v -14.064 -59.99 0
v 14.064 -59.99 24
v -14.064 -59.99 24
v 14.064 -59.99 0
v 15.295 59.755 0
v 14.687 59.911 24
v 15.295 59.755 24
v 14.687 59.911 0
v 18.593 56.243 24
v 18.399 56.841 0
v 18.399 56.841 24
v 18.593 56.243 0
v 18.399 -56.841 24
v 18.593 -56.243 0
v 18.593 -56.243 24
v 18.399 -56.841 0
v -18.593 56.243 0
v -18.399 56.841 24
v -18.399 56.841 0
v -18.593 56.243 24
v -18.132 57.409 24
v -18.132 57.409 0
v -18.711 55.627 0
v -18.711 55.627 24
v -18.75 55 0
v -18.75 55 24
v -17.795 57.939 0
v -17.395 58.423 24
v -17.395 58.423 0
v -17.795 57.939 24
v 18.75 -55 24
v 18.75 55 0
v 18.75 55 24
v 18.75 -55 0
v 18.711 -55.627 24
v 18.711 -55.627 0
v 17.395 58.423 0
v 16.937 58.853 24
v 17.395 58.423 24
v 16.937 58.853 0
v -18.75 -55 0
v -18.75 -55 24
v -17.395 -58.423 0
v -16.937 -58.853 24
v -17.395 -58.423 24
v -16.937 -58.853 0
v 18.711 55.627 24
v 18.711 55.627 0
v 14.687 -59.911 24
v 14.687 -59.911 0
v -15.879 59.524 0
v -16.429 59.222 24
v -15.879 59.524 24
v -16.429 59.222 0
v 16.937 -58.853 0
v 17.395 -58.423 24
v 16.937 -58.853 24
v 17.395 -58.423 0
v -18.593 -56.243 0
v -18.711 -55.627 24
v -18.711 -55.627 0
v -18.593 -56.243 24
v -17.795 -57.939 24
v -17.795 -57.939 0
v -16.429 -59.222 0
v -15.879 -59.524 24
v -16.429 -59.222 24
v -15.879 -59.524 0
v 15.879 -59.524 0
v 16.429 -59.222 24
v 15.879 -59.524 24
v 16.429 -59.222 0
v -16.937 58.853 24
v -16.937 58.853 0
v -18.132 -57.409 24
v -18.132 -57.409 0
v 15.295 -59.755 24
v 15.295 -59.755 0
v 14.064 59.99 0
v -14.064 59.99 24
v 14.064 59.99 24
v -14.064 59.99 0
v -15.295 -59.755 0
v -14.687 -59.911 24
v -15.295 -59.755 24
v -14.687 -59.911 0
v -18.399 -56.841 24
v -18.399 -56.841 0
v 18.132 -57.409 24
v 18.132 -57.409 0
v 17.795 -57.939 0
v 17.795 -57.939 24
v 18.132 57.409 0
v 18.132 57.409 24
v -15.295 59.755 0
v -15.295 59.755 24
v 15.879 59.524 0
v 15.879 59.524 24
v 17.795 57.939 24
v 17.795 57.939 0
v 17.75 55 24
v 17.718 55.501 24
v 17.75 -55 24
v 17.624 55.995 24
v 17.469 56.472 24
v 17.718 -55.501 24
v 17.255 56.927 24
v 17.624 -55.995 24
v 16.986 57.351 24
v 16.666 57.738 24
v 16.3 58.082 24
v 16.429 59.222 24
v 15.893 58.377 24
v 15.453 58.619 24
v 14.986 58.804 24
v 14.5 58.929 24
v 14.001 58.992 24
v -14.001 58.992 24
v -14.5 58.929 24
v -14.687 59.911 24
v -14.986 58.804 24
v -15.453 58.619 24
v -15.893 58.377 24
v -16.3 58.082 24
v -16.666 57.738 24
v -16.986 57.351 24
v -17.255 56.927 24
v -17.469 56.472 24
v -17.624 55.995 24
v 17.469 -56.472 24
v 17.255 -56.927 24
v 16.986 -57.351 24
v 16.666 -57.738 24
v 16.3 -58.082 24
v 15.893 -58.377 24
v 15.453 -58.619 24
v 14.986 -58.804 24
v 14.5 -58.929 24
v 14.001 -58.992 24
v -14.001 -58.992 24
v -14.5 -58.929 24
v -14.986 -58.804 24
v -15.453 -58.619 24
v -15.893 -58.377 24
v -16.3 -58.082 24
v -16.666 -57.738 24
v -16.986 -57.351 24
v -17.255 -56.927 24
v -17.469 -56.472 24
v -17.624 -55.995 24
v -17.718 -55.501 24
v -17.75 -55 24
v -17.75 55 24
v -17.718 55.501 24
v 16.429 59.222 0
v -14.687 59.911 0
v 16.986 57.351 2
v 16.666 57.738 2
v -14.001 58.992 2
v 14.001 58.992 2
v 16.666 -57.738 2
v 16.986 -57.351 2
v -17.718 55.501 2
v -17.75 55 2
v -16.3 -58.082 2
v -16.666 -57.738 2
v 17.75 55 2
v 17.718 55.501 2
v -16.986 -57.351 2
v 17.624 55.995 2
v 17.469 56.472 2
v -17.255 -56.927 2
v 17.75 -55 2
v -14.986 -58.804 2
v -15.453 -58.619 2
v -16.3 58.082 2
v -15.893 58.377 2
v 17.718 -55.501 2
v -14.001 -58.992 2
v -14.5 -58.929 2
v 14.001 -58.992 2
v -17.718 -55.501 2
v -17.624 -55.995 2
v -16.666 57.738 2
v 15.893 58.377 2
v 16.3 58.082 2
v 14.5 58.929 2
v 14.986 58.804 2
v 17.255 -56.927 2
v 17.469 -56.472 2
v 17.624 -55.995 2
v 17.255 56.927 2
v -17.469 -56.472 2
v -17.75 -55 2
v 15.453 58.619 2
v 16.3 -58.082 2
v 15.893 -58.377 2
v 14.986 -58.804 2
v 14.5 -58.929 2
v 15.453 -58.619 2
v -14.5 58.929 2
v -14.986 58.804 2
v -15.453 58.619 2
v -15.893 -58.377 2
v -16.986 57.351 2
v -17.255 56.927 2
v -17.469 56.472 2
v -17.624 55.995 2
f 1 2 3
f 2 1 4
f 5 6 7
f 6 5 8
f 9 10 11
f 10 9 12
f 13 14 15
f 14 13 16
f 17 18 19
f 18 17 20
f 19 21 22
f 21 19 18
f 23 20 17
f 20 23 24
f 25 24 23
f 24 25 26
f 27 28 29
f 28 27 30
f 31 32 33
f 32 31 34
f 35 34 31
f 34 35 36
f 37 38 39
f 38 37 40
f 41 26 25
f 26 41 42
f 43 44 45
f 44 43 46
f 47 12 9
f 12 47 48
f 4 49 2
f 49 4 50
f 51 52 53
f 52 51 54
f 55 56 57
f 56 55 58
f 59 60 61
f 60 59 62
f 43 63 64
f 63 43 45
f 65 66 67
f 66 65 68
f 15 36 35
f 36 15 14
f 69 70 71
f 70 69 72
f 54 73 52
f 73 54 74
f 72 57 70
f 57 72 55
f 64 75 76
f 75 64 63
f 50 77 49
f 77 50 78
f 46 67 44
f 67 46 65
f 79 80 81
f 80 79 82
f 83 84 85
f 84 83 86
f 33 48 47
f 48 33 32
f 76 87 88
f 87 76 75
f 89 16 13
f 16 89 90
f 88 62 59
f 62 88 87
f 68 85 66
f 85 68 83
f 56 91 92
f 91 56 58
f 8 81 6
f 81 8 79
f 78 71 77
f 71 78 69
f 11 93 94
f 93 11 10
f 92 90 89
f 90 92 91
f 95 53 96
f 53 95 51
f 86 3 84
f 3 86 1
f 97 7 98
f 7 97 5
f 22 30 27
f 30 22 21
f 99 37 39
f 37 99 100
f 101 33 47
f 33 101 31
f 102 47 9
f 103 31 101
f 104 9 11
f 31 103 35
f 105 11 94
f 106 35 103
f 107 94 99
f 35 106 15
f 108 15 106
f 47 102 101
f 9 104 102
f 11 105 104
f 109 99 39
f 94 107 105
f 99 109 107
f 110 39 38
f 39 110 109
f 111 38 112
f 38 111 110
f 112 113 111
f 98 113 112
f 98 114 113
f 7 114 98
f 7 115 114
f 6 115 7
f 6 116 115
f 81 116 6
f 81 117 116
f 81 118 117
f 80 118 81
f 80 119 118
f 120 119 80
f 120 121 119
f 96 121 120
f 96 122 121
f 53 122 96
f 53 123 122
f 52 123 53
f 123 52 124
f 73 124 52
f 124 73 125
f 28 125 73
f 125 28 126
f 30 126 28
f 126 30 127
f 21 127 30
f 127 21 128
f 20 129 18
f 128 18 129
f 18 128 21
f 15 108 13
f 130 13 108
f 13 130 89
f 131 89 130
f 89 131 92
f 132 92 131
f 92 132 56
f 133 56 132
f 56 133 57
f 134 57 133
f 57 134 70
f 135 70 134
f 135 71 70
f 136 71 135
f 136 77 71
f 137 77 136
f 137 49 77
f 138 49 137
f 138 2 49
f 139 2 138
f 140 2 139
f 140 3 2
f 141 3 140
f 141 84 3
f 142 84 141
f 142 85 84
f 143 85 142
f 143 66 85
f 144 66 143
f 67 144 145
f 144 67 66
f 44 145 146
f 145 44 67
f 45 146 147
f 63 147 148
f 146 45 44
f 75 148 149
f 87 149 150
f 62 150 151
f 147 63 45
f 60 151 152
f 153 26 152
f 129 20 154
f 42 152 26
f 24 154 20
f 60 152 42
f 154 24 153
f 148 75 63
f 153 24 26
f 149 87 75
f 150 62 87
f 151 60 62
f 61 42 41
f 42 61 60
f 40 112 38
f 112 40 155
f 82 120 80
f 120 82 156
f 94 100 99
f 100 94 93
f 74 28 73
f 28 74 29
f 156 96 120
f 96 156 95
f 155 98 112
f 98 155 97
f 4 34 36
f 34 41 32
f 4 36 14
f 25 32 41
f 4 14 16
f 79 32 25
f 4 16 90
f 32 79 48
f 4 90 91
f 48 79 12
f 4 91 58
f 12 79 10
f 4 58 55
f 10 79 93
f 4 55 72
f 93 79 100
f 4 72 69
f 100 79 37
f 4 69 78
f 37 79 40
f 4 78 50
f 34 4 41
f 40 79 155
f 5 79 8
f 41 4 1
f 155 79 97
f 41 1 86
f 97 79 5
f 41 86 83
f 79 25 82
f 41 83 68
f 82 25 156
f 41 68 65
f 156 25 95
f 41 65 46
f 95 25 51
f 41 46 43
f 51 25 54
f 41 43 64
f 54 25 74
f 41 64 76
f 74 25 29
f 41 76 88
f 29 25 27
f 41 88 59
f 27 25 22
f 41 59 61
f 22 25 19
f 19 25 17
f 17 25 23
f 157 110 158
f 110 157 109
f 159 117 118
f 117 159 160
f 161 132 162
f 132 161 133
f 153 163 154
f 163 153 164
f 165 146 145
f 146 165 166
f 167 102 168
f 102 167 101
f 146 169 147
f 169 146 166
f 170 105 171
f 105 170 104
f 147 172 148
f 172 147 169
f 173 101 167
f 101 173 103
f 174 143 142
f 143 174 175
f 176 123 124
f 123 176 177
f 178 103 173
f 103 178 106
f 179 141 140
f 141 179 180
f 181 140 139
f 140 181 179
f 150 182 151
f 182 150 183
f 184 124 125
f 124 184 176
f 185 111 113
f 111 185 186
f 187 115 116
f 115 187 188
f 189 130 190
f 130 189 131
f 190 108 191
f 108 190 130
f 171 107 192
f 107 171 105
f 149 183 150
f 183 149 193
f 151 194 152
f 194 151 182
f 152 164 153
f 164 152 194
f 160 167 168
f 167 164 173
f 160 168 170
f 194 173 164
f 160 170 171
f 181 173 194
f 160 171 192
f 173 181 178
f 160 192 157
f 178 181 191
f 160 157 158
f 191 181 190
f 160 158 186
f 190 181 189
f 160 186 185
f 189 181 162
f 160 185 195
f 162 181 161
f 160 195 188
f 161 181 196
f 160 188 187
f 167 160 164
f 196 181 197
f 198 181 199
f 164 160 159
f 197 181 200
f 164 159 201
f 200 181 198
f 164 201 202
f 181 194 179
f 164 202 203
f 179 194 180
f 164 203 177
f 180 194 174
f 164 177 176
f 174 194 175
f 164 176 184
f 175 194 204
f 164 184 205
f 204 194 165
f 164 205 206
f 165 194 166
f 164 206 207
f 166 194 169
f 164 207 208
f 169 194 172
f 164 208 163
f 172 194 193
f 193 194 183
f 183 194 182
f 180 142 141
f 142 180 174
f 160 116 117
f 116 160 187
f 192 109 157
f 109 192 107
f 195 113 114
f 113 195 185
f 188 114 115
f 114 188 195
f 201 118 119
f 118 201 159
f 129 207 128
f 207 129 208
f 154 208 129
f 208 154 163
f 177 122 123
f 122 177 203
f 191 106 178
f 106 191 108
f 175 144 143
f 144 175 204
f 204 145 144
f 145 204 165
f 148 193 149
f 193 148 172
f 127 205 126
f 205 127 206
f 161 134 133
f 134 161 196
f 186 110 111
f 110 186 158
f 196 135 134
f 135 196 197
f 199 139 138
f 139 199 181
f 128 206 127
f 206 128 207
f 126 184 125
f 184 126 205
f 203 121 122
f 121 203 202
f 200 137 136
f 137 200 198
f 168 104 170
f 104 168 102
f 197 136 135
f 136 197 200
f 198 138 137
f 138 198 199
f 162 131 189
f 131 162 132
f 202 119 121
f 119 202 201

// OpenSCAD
$fn = 50;


difference() {
	union() {
		hull() {
			translate(v = [-13.7500000000, 55.0000000000, 0]) {
				cylinder(h = 24, r = 5);
			}
			translate(v = [13.7500000000, 55.0000000000, 0]) {
				cylinder(h = 24, r = 5);
			}
			translate(v = [-13.7500000000, -55.0000000000, 0]) {
				cylinder(h = 24, r = 5);
			}
			translate(v = [13.7500000000, -55.0000000000, 0]) {
				cylinder(h = 24, r = 5);
			}
		}
	}
	union() {
		translate(v = [0, 0, 2]) {
			hull() {
				translate(v = [-13.7500000000, 55.0000000000, 0]) {
					cylinder(h = 22, r = 4);
				}
				translate(v = [13.7500000000, 55.0000000000, 0]) {
					cylinder(h = 22, r = 4);
				}
				translate(v = [-13.7500000000, -55.0000000000, 0]) {
					cylinder(h = 22, r = 4);
				}
				translate(v = [13.7500000000, -55.0000000000, 0]) {
					cylinder(h = 22, r = 4);
				}
			}
		}
	}
}
